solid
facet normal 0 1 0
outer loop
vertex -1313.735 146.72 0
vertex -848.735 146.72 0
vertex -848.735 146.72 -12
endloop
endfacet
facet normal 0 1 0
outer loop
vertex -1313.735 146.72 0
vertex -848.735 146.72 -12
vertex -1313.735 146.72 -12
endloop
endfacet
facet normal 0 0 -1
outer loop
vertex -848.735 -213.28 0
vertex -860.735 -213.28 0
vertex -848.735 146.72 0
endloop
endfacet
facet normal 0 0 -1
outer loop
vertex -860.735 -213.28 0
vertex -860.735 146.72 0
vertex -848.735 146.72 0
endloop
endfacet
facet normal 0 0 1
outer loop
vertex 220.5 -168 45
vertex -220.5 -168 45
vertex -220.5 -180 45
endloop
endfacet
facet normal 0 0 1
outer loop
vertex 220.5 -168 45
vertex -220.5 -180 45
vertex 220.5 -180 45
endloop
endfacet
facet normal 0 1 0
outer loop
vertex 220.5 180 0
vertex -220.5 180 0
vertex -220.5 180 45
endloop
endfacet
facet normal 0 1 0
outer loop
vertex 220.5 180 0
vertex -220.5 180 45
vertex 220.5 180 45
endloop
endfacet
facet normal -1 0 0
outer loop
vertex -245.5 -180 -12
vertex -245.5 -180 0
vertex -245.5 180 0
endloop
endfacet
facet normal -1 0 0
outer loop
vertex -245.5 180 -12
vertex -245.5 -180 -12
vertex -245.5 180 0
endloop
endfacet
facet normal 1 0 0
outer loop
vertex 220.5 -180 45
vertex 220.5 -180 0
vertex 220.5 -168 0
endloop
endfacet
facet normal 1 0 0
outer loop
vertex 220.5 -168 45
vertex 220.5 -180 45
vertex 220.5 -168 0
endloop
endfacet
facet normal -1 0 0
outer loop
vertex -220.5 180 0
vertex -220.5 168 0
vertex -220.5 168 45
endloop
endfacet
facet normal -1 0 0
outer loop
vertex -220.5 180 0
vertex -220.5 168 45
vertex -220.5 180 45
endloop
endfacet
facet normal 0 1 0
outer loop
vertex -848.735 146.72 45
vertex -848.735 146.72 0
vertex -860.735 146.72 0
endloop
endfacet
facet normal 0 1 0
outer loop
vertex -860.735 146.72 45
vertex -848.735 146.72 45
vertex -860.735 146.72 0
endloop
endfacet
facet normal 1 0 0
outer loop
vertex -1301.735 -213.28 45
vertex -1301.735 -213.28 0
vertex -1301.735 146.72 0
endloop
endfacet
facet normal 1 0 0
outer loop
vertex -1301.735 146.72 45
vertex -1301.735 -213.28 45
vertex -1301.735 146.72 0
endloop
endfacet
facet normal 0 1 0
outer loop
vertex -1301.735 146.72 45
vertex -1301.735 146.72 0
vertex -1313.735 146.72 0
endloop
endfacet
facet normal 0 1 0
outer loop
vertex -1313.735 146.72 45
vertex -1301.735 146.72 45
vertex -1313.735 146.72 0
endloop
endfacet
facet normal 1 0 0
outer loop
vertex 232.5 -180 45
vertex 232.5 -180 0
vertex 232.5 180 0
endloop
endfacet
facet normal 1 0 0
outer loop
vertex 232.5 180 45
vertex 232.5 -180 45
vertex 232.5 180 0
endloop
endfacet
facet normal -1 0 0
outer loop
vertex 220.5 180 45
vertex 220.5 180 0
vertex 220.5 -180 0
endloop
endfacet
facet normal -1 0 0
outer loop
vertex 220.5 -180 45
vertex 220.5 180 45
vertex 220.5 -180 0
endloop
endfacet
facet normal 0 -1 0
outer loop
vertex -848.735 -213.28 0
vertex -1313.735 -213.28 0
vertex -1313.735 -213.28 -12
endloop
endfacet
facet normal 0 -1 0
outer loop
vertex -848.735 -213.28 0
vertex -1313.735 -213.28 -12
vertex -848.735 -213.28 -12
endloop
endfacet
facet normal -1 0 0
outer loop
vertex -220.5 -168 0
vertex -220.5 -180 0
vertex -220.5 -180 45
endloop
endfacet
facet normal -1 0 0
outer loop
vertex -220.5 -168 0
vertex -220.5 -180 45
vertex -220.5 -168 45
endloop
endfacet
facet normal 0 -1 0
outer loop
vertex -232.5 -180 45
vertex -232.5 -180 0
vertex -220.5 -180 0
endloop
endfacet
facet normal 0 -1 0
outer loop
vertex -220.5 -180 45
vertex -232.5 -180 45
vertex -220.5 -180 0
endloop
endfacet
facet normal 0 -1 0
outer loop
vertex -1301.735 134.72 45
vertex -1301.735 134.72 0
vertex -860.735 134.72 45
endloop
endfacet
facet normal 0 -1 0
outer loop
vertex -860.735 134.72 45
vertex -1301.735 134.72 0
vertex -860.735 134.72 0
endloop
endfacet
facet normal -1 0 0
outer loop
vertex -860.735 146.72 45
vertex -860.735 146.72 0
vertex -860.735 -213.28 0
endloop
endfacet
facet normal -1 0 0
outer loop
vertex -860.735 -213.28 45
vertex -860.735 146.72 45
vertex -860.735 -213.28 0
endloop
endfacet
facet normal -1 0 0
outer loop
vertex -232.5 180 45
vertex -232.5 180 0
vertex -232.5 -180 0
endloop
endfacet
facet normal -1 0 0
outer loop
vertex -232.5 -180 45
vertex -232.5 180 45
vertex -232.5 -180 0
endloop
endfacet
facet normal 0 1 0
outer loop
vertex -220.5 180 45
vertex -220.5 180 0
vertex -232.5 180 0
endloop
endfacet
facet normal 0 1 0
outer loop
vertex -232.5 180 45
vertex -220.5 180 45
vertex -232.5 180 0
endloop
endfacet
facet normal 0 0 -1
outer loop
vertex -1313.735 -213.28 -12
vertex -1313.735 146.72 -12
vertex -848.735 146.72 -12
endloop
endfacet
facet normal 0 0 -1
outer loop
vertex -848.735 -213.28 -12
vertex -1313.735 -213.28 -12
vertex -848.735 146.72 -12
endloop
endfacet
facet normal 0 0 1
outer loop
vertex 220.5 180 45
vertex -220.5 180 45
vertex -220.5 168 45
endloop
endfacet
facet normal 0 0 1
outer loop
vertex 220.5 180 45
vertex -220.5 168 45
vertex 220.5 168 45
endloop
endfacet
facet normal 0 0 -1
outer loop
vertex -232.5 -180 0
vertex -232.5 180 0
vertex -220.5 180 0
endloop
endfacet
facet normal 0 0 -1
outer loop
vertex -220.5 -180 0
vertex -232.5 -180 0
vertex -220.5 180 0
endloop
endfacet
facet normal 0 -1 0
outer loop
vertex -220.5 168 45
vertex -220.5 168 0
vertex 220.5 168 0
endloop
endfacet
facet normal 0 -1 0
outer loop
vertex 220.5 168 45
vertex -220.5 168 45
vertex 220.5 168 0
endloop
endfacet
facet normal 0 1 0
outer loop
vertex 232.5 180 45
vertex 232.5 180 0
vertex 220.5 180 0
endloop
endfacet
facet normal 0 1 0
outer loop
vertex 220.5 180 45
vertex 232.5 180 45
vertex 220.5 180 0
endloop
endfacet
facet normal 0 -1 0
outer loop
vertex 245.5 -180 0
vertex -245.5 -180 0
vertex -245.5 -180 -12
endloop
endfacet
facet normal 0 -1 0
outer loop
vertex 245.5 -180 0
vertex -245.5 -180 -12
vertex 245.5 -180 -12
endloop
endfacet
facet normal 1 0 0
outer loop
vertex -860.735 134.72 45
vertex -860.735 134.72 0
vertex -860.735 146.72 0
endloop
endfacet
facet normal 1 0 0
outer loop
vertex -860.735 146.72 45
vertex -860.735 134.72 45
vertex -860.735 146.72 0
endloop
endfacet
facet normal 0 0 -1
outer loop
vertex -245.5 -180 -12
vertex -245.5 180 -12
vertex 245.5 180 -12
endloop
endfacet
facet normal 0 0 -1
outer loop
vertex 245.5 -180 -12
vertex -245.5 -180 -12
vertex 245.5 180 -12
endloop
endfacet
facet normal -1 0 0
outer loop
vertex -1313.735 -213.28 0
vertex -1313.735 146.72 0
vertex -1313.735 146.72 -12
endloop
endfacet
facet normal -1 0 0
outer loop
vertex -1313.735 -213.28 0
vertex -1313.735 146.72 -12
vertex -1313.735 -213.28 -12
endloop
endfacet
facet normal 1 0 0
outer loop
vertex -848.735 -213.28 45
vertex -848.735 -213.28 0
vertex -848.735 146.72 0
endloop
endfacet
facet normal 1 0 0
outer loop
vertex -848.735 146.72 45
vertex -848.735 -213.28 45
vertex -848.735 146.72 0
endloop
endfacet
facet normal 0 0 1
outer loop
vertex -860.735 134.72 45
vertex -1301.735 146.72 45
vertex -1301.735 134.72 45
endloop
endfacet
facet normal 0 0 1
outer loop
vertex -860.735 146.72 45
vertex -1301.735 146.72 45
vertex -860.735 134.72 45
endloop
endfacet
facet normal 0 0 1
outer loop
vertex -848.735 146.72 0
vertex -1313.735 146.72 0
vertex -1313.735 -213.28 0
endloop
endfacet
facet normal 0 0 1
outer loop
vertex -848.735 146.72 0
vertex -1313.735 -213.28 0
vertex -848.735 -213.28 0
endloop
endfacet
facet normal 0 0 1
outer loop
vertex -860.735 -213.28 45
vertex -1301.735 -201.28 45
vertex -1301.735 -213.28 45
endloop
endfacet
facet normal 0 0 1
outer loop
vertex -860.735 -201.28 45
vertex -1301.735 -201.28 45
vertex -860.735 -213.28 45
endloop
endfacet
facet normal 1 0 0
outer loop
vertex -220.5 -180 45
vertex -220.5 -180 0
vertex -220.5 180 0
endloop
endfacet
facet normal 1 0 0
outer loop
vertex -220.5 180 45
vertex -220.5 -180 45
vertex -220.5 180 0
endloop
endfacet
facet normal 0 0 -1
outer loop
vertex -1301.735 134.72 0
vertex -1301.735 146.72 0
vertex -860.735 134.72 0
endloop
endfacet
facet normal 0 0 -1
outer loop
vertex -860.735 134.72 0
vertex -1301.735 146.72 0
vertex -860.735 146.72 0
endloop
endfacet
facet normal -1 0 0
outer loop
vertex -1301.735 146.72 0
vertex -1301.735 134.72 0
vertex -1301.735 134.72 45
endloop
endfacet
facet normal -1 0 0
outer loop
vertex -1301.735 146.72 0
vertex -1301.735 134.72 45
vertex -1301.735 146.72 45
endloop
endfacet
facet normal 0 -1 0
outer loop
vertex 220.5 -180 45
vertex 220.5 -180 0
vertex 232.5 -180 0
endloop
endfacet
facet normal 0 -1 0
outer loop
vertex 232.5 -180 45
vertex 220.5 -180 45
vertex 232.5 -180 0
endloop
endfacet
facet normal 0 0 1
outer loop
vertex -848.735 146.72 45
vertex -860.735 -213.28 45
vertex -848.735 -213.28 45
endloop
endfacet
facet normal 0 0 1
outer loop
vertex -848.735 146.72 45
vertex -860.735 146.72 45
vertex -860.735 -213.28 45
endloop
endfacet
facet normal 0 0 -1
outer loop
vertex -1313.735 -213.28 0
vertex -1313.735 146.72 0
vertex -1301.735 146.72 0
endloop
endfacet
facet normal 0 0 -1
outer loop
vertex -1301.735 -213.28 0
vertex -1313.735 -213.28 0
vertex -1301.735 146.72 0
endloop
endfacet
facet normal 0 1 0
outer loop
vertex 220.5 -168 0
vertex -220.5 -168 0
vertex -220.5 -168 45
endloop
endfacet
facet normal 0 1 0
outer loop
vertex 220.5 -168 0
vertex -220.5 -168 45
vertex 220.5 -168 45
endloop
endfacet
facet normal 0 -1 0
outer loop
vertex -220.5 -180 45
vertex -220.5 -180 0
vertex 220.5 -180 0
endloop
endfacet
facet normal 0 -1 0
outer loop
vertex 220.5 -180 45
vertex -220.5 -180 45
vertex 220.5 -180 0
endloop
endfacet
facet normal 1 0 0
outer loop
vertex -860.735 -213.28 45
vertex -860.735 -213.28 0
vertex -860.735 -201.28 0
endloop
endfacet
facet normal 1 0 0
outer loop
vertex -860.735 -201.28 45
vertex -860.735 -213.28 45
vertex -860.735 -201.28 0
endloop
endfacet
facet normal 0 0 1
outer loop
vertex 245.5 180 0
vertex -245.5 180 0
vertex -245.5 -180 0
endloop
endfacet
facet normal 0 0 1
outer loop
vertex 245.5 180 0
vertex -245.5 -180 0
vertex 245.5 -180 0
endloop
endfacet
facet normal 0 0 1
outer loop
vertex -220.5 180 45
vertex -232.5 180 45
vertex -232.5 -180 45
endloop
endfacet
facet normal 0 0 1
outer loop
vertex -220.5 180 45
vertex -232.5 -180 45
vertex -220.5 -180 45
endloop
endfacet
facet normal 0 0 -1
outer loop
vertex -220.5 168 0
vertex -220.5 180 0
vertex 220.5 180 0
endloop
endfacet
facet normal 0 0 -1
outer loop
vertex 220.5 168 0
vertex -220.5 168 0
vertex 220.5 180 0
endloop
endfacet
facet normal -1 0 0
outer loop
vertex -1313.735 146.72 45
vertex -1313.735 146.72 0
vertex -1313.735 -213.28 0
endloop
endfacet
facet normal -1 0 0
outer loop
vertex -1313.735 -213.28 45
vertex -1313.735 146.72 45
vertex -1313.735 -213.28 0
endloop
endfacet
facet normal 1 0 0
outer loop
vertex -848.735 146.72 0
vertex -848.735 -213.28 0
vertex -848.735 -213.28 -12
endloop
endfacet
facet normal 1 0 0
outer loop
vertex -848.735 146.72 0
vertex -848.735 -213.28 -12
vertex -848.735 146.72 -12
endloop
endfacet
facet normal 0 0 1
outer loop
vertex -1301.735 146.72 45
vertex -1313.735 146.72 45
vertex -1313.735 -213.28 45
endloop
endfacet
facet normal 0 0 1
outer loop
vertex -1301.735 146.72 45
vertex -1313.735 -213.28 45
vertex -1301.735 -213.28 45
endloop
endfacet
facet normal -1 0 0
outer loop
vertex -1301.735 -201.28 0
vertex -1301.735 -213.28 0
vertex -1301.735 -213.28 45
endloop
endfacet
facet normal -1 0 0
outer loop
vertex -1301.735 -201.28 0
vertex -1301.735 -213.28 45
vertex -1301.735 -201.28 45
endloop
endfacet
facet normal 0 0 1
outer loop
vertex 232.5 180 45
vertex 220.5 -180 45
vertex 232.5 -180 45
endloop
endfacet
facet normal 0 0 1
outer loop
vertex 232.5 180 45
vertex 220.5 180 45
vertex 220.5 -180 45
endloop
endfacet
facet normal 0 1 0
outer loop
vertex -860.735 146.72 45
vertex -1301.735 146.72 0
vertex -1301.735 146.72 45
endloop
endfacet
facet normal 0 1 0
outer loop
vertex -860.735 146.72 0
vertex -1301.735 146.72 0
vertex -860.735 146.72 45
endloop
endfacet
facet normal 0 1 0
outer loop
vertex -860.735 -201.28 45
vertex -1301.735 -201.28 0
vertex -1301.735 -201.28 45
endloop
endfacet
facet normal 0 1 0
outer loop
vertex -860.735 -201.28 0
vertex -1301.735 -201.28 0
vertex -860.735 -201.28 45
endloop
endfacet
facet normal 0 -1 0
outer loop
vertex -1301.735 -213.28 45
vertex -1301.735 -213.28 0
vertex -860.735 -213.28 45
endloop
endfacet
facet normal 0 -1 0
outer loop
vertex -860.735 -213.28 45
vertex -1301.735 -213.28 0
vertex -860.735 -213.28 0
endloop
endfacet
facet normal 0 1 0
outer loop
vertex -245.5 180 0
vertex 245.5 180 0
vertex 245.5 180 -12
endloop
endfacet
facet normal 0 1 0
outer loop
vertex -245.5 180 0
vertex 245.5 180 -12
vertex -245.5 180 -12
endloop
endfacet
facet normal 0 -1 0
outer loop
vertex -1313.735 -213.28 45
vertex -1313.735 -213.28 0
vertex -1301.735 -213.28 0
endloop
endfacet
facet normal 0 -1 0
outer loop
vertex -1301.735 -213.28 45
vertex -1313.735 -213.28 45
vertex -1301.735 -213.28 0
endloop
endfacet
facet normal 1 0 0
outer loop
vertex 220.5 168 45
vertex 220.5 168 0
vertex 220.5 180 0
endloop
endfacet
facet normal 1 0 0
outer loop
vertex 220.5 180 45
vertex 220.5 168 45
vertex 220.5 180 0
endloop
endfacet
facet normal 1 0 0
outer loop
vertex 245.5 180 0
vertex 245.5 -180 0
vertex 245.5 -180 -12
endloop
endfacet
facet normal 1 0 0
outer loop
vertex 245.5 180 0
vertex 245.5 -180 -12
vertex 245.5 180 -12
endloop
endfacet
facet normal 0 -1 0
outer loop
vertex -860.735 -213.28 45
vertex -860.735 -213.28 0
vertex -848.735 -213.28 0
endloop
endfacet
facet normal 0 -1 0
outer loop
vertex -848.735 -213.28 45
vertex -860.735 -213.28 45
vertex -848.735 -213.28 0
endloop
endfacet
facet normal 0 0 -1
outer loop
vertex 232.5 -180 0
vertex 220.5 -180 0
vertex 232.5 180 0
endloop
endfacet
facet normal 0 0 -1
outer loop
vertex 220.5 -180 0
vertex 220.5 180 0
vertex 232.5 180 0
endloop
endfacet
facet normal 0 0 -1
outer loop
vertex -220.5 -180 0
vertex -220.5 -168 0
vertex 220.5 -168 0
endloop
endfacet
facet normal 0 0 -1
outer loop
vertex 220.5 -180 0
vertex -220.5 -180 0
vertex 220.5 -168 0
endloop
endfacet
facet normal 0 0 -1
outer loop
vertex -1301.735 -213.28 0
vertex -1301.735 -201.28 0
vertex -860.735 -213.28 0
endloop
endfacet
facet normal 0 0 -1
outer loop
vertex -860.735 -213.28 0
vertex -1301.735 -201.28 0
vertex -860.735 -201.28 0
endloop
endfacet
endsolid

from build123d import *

# Parameters (mm, degrees)
F0_W     = 13
F0_H     = 360
F0_W_2   = 441
F0_H_2   = 12
F0_H_3   = 336
F1_DEPTH = 12
F2_DEPTH = 45
F3_DEPTH = 45
F4_W     = 441
F4_H     = 12
F4_H_2   = 336
F5_DEPTH = 12
F6_DEPTH = 45
F7_DEPTH = 45


with BuildPart() as f1:
    # F0 (on Top) → F1 (new body)
    with BuildSketch(Plane.XY):
        Polygon((-232.5, 180), (-232.5, -180), (-220.5, -180), (-220.5, -168), (-220.5, 168), (-220.5, 180), align=None)
        with Locations((-239, 0)):
            Rectangle(F0_W, F0_H)
        with Locations((0, -174)):
            Rectangle(F0_W_2, F0_H_2)
        Polygon((220.5, -168), (220.5, -180), (232.5, -180), (232.5, 180), (220.5, 180), (220.5, 168), align=None)
        with Locations((0, 174)):
            Rectangle(F0_W_2, F0_H_2)
        with Locations((239, 0)):
            Rectangle(F0_W, F0_H)
        Rectangle(F0_W_2, F0_H_3)
    extrude(amount=-F1_DEPTH)


with BuildPart() as f2:
    # F0 (on Top) → F2 (new body)
    with BuildSketch(Plane.XY):
        Polygon((-232.5, 180), (-232.5, -180), (-220.5, -180), (-220.5, -168), (-220.5, 168), (-220.5, 180), align=None)
        Polygon((220.5, -168), (220.5, -180), (232.5, -180), (232.5, 180), (220.5, 180), (220.5, 168), align=None)
    extrude(amount=F2_DEPTH)


with BuildPart() as f3:
    # F0 (on Top) → F3 (new body)
    with BuildSketch(Plane.XY):
        with Locations((0, 174)):
            Rectangle(F0_W_2, F0_H_2)
        with Locations((0, -174)):
            Rectangle(F0_W_2, F0_H_2)
    extrude(amount=F3_DEPTH)


with BuildPart() as f5:
    # F4 (on Top) → F5 (new body)
    with BuildSketch(Plane.XY):
        with Locations((-1081.234694, -207.27962)):
            Rectangle(F4_W, F4_H)
        with Locations((-1081.234694, 140.72038)):
            Rectangle(F4_W, F4_H)
        Polygon((-1313.734694, 146.72038), (-1313.734694, -213.27962), (-1301.734694, -213.27962), (-1301.734694, -201.27962), (-1301.734694, 134.72038), (-1301.734694, 146.72038), align=None)
        Polygon((-860.734694, -201.27962), (-860.734694, -213.27962), (-848.734694, -213.27962), (-848.734694, 146.72038), (-860.734694, 146.72038), (-860.734694, 134.72038), align=None)
        with Locations((-1081.234694, -33.27962)):
            Rectangle(F4_W, F4_H_2)
    extrude(amount=-F5_DEPTH)


with BuildPart() as f6:
    # F4 (on Top) → F6 (new body)
    with BuildSketch(Plane.XY):
        Polygon((-860.734694, -201.27962), (-860.734694, -213.27962), (-848.734694, -213.27962), (-848.734694, 146.72038), (-860.734694, 146.72038), (-860.734694, 134.72038), align=None)
        Polygon((-1313.734694, 146.72038), (-1313.734694, -213.27962), (-1301.734694, -213.27962), (-1301.734694, -201.27962), (-1301.734694, 134.72038), (-1301.734694, 146.72038), align=None)
    extrude(amount=F6_DEPTH)


with BuildPart() as f7:
    # F4 (on Top) → F7 (new body)
    with BuildSketch(Plane.XY):
        with Locations((-1081.234694, 140.72038)):
            Rectangle(F4_W, F4_H)
        with Locations((-1081.234694, -207.27962)):
            Rectangle(F4_W, F4_H)
    extrude(amount=F7_DEPTH)


solid = Compound([f1.part, f2.part, f3.part, f5.part, f6.part, f7.part])
